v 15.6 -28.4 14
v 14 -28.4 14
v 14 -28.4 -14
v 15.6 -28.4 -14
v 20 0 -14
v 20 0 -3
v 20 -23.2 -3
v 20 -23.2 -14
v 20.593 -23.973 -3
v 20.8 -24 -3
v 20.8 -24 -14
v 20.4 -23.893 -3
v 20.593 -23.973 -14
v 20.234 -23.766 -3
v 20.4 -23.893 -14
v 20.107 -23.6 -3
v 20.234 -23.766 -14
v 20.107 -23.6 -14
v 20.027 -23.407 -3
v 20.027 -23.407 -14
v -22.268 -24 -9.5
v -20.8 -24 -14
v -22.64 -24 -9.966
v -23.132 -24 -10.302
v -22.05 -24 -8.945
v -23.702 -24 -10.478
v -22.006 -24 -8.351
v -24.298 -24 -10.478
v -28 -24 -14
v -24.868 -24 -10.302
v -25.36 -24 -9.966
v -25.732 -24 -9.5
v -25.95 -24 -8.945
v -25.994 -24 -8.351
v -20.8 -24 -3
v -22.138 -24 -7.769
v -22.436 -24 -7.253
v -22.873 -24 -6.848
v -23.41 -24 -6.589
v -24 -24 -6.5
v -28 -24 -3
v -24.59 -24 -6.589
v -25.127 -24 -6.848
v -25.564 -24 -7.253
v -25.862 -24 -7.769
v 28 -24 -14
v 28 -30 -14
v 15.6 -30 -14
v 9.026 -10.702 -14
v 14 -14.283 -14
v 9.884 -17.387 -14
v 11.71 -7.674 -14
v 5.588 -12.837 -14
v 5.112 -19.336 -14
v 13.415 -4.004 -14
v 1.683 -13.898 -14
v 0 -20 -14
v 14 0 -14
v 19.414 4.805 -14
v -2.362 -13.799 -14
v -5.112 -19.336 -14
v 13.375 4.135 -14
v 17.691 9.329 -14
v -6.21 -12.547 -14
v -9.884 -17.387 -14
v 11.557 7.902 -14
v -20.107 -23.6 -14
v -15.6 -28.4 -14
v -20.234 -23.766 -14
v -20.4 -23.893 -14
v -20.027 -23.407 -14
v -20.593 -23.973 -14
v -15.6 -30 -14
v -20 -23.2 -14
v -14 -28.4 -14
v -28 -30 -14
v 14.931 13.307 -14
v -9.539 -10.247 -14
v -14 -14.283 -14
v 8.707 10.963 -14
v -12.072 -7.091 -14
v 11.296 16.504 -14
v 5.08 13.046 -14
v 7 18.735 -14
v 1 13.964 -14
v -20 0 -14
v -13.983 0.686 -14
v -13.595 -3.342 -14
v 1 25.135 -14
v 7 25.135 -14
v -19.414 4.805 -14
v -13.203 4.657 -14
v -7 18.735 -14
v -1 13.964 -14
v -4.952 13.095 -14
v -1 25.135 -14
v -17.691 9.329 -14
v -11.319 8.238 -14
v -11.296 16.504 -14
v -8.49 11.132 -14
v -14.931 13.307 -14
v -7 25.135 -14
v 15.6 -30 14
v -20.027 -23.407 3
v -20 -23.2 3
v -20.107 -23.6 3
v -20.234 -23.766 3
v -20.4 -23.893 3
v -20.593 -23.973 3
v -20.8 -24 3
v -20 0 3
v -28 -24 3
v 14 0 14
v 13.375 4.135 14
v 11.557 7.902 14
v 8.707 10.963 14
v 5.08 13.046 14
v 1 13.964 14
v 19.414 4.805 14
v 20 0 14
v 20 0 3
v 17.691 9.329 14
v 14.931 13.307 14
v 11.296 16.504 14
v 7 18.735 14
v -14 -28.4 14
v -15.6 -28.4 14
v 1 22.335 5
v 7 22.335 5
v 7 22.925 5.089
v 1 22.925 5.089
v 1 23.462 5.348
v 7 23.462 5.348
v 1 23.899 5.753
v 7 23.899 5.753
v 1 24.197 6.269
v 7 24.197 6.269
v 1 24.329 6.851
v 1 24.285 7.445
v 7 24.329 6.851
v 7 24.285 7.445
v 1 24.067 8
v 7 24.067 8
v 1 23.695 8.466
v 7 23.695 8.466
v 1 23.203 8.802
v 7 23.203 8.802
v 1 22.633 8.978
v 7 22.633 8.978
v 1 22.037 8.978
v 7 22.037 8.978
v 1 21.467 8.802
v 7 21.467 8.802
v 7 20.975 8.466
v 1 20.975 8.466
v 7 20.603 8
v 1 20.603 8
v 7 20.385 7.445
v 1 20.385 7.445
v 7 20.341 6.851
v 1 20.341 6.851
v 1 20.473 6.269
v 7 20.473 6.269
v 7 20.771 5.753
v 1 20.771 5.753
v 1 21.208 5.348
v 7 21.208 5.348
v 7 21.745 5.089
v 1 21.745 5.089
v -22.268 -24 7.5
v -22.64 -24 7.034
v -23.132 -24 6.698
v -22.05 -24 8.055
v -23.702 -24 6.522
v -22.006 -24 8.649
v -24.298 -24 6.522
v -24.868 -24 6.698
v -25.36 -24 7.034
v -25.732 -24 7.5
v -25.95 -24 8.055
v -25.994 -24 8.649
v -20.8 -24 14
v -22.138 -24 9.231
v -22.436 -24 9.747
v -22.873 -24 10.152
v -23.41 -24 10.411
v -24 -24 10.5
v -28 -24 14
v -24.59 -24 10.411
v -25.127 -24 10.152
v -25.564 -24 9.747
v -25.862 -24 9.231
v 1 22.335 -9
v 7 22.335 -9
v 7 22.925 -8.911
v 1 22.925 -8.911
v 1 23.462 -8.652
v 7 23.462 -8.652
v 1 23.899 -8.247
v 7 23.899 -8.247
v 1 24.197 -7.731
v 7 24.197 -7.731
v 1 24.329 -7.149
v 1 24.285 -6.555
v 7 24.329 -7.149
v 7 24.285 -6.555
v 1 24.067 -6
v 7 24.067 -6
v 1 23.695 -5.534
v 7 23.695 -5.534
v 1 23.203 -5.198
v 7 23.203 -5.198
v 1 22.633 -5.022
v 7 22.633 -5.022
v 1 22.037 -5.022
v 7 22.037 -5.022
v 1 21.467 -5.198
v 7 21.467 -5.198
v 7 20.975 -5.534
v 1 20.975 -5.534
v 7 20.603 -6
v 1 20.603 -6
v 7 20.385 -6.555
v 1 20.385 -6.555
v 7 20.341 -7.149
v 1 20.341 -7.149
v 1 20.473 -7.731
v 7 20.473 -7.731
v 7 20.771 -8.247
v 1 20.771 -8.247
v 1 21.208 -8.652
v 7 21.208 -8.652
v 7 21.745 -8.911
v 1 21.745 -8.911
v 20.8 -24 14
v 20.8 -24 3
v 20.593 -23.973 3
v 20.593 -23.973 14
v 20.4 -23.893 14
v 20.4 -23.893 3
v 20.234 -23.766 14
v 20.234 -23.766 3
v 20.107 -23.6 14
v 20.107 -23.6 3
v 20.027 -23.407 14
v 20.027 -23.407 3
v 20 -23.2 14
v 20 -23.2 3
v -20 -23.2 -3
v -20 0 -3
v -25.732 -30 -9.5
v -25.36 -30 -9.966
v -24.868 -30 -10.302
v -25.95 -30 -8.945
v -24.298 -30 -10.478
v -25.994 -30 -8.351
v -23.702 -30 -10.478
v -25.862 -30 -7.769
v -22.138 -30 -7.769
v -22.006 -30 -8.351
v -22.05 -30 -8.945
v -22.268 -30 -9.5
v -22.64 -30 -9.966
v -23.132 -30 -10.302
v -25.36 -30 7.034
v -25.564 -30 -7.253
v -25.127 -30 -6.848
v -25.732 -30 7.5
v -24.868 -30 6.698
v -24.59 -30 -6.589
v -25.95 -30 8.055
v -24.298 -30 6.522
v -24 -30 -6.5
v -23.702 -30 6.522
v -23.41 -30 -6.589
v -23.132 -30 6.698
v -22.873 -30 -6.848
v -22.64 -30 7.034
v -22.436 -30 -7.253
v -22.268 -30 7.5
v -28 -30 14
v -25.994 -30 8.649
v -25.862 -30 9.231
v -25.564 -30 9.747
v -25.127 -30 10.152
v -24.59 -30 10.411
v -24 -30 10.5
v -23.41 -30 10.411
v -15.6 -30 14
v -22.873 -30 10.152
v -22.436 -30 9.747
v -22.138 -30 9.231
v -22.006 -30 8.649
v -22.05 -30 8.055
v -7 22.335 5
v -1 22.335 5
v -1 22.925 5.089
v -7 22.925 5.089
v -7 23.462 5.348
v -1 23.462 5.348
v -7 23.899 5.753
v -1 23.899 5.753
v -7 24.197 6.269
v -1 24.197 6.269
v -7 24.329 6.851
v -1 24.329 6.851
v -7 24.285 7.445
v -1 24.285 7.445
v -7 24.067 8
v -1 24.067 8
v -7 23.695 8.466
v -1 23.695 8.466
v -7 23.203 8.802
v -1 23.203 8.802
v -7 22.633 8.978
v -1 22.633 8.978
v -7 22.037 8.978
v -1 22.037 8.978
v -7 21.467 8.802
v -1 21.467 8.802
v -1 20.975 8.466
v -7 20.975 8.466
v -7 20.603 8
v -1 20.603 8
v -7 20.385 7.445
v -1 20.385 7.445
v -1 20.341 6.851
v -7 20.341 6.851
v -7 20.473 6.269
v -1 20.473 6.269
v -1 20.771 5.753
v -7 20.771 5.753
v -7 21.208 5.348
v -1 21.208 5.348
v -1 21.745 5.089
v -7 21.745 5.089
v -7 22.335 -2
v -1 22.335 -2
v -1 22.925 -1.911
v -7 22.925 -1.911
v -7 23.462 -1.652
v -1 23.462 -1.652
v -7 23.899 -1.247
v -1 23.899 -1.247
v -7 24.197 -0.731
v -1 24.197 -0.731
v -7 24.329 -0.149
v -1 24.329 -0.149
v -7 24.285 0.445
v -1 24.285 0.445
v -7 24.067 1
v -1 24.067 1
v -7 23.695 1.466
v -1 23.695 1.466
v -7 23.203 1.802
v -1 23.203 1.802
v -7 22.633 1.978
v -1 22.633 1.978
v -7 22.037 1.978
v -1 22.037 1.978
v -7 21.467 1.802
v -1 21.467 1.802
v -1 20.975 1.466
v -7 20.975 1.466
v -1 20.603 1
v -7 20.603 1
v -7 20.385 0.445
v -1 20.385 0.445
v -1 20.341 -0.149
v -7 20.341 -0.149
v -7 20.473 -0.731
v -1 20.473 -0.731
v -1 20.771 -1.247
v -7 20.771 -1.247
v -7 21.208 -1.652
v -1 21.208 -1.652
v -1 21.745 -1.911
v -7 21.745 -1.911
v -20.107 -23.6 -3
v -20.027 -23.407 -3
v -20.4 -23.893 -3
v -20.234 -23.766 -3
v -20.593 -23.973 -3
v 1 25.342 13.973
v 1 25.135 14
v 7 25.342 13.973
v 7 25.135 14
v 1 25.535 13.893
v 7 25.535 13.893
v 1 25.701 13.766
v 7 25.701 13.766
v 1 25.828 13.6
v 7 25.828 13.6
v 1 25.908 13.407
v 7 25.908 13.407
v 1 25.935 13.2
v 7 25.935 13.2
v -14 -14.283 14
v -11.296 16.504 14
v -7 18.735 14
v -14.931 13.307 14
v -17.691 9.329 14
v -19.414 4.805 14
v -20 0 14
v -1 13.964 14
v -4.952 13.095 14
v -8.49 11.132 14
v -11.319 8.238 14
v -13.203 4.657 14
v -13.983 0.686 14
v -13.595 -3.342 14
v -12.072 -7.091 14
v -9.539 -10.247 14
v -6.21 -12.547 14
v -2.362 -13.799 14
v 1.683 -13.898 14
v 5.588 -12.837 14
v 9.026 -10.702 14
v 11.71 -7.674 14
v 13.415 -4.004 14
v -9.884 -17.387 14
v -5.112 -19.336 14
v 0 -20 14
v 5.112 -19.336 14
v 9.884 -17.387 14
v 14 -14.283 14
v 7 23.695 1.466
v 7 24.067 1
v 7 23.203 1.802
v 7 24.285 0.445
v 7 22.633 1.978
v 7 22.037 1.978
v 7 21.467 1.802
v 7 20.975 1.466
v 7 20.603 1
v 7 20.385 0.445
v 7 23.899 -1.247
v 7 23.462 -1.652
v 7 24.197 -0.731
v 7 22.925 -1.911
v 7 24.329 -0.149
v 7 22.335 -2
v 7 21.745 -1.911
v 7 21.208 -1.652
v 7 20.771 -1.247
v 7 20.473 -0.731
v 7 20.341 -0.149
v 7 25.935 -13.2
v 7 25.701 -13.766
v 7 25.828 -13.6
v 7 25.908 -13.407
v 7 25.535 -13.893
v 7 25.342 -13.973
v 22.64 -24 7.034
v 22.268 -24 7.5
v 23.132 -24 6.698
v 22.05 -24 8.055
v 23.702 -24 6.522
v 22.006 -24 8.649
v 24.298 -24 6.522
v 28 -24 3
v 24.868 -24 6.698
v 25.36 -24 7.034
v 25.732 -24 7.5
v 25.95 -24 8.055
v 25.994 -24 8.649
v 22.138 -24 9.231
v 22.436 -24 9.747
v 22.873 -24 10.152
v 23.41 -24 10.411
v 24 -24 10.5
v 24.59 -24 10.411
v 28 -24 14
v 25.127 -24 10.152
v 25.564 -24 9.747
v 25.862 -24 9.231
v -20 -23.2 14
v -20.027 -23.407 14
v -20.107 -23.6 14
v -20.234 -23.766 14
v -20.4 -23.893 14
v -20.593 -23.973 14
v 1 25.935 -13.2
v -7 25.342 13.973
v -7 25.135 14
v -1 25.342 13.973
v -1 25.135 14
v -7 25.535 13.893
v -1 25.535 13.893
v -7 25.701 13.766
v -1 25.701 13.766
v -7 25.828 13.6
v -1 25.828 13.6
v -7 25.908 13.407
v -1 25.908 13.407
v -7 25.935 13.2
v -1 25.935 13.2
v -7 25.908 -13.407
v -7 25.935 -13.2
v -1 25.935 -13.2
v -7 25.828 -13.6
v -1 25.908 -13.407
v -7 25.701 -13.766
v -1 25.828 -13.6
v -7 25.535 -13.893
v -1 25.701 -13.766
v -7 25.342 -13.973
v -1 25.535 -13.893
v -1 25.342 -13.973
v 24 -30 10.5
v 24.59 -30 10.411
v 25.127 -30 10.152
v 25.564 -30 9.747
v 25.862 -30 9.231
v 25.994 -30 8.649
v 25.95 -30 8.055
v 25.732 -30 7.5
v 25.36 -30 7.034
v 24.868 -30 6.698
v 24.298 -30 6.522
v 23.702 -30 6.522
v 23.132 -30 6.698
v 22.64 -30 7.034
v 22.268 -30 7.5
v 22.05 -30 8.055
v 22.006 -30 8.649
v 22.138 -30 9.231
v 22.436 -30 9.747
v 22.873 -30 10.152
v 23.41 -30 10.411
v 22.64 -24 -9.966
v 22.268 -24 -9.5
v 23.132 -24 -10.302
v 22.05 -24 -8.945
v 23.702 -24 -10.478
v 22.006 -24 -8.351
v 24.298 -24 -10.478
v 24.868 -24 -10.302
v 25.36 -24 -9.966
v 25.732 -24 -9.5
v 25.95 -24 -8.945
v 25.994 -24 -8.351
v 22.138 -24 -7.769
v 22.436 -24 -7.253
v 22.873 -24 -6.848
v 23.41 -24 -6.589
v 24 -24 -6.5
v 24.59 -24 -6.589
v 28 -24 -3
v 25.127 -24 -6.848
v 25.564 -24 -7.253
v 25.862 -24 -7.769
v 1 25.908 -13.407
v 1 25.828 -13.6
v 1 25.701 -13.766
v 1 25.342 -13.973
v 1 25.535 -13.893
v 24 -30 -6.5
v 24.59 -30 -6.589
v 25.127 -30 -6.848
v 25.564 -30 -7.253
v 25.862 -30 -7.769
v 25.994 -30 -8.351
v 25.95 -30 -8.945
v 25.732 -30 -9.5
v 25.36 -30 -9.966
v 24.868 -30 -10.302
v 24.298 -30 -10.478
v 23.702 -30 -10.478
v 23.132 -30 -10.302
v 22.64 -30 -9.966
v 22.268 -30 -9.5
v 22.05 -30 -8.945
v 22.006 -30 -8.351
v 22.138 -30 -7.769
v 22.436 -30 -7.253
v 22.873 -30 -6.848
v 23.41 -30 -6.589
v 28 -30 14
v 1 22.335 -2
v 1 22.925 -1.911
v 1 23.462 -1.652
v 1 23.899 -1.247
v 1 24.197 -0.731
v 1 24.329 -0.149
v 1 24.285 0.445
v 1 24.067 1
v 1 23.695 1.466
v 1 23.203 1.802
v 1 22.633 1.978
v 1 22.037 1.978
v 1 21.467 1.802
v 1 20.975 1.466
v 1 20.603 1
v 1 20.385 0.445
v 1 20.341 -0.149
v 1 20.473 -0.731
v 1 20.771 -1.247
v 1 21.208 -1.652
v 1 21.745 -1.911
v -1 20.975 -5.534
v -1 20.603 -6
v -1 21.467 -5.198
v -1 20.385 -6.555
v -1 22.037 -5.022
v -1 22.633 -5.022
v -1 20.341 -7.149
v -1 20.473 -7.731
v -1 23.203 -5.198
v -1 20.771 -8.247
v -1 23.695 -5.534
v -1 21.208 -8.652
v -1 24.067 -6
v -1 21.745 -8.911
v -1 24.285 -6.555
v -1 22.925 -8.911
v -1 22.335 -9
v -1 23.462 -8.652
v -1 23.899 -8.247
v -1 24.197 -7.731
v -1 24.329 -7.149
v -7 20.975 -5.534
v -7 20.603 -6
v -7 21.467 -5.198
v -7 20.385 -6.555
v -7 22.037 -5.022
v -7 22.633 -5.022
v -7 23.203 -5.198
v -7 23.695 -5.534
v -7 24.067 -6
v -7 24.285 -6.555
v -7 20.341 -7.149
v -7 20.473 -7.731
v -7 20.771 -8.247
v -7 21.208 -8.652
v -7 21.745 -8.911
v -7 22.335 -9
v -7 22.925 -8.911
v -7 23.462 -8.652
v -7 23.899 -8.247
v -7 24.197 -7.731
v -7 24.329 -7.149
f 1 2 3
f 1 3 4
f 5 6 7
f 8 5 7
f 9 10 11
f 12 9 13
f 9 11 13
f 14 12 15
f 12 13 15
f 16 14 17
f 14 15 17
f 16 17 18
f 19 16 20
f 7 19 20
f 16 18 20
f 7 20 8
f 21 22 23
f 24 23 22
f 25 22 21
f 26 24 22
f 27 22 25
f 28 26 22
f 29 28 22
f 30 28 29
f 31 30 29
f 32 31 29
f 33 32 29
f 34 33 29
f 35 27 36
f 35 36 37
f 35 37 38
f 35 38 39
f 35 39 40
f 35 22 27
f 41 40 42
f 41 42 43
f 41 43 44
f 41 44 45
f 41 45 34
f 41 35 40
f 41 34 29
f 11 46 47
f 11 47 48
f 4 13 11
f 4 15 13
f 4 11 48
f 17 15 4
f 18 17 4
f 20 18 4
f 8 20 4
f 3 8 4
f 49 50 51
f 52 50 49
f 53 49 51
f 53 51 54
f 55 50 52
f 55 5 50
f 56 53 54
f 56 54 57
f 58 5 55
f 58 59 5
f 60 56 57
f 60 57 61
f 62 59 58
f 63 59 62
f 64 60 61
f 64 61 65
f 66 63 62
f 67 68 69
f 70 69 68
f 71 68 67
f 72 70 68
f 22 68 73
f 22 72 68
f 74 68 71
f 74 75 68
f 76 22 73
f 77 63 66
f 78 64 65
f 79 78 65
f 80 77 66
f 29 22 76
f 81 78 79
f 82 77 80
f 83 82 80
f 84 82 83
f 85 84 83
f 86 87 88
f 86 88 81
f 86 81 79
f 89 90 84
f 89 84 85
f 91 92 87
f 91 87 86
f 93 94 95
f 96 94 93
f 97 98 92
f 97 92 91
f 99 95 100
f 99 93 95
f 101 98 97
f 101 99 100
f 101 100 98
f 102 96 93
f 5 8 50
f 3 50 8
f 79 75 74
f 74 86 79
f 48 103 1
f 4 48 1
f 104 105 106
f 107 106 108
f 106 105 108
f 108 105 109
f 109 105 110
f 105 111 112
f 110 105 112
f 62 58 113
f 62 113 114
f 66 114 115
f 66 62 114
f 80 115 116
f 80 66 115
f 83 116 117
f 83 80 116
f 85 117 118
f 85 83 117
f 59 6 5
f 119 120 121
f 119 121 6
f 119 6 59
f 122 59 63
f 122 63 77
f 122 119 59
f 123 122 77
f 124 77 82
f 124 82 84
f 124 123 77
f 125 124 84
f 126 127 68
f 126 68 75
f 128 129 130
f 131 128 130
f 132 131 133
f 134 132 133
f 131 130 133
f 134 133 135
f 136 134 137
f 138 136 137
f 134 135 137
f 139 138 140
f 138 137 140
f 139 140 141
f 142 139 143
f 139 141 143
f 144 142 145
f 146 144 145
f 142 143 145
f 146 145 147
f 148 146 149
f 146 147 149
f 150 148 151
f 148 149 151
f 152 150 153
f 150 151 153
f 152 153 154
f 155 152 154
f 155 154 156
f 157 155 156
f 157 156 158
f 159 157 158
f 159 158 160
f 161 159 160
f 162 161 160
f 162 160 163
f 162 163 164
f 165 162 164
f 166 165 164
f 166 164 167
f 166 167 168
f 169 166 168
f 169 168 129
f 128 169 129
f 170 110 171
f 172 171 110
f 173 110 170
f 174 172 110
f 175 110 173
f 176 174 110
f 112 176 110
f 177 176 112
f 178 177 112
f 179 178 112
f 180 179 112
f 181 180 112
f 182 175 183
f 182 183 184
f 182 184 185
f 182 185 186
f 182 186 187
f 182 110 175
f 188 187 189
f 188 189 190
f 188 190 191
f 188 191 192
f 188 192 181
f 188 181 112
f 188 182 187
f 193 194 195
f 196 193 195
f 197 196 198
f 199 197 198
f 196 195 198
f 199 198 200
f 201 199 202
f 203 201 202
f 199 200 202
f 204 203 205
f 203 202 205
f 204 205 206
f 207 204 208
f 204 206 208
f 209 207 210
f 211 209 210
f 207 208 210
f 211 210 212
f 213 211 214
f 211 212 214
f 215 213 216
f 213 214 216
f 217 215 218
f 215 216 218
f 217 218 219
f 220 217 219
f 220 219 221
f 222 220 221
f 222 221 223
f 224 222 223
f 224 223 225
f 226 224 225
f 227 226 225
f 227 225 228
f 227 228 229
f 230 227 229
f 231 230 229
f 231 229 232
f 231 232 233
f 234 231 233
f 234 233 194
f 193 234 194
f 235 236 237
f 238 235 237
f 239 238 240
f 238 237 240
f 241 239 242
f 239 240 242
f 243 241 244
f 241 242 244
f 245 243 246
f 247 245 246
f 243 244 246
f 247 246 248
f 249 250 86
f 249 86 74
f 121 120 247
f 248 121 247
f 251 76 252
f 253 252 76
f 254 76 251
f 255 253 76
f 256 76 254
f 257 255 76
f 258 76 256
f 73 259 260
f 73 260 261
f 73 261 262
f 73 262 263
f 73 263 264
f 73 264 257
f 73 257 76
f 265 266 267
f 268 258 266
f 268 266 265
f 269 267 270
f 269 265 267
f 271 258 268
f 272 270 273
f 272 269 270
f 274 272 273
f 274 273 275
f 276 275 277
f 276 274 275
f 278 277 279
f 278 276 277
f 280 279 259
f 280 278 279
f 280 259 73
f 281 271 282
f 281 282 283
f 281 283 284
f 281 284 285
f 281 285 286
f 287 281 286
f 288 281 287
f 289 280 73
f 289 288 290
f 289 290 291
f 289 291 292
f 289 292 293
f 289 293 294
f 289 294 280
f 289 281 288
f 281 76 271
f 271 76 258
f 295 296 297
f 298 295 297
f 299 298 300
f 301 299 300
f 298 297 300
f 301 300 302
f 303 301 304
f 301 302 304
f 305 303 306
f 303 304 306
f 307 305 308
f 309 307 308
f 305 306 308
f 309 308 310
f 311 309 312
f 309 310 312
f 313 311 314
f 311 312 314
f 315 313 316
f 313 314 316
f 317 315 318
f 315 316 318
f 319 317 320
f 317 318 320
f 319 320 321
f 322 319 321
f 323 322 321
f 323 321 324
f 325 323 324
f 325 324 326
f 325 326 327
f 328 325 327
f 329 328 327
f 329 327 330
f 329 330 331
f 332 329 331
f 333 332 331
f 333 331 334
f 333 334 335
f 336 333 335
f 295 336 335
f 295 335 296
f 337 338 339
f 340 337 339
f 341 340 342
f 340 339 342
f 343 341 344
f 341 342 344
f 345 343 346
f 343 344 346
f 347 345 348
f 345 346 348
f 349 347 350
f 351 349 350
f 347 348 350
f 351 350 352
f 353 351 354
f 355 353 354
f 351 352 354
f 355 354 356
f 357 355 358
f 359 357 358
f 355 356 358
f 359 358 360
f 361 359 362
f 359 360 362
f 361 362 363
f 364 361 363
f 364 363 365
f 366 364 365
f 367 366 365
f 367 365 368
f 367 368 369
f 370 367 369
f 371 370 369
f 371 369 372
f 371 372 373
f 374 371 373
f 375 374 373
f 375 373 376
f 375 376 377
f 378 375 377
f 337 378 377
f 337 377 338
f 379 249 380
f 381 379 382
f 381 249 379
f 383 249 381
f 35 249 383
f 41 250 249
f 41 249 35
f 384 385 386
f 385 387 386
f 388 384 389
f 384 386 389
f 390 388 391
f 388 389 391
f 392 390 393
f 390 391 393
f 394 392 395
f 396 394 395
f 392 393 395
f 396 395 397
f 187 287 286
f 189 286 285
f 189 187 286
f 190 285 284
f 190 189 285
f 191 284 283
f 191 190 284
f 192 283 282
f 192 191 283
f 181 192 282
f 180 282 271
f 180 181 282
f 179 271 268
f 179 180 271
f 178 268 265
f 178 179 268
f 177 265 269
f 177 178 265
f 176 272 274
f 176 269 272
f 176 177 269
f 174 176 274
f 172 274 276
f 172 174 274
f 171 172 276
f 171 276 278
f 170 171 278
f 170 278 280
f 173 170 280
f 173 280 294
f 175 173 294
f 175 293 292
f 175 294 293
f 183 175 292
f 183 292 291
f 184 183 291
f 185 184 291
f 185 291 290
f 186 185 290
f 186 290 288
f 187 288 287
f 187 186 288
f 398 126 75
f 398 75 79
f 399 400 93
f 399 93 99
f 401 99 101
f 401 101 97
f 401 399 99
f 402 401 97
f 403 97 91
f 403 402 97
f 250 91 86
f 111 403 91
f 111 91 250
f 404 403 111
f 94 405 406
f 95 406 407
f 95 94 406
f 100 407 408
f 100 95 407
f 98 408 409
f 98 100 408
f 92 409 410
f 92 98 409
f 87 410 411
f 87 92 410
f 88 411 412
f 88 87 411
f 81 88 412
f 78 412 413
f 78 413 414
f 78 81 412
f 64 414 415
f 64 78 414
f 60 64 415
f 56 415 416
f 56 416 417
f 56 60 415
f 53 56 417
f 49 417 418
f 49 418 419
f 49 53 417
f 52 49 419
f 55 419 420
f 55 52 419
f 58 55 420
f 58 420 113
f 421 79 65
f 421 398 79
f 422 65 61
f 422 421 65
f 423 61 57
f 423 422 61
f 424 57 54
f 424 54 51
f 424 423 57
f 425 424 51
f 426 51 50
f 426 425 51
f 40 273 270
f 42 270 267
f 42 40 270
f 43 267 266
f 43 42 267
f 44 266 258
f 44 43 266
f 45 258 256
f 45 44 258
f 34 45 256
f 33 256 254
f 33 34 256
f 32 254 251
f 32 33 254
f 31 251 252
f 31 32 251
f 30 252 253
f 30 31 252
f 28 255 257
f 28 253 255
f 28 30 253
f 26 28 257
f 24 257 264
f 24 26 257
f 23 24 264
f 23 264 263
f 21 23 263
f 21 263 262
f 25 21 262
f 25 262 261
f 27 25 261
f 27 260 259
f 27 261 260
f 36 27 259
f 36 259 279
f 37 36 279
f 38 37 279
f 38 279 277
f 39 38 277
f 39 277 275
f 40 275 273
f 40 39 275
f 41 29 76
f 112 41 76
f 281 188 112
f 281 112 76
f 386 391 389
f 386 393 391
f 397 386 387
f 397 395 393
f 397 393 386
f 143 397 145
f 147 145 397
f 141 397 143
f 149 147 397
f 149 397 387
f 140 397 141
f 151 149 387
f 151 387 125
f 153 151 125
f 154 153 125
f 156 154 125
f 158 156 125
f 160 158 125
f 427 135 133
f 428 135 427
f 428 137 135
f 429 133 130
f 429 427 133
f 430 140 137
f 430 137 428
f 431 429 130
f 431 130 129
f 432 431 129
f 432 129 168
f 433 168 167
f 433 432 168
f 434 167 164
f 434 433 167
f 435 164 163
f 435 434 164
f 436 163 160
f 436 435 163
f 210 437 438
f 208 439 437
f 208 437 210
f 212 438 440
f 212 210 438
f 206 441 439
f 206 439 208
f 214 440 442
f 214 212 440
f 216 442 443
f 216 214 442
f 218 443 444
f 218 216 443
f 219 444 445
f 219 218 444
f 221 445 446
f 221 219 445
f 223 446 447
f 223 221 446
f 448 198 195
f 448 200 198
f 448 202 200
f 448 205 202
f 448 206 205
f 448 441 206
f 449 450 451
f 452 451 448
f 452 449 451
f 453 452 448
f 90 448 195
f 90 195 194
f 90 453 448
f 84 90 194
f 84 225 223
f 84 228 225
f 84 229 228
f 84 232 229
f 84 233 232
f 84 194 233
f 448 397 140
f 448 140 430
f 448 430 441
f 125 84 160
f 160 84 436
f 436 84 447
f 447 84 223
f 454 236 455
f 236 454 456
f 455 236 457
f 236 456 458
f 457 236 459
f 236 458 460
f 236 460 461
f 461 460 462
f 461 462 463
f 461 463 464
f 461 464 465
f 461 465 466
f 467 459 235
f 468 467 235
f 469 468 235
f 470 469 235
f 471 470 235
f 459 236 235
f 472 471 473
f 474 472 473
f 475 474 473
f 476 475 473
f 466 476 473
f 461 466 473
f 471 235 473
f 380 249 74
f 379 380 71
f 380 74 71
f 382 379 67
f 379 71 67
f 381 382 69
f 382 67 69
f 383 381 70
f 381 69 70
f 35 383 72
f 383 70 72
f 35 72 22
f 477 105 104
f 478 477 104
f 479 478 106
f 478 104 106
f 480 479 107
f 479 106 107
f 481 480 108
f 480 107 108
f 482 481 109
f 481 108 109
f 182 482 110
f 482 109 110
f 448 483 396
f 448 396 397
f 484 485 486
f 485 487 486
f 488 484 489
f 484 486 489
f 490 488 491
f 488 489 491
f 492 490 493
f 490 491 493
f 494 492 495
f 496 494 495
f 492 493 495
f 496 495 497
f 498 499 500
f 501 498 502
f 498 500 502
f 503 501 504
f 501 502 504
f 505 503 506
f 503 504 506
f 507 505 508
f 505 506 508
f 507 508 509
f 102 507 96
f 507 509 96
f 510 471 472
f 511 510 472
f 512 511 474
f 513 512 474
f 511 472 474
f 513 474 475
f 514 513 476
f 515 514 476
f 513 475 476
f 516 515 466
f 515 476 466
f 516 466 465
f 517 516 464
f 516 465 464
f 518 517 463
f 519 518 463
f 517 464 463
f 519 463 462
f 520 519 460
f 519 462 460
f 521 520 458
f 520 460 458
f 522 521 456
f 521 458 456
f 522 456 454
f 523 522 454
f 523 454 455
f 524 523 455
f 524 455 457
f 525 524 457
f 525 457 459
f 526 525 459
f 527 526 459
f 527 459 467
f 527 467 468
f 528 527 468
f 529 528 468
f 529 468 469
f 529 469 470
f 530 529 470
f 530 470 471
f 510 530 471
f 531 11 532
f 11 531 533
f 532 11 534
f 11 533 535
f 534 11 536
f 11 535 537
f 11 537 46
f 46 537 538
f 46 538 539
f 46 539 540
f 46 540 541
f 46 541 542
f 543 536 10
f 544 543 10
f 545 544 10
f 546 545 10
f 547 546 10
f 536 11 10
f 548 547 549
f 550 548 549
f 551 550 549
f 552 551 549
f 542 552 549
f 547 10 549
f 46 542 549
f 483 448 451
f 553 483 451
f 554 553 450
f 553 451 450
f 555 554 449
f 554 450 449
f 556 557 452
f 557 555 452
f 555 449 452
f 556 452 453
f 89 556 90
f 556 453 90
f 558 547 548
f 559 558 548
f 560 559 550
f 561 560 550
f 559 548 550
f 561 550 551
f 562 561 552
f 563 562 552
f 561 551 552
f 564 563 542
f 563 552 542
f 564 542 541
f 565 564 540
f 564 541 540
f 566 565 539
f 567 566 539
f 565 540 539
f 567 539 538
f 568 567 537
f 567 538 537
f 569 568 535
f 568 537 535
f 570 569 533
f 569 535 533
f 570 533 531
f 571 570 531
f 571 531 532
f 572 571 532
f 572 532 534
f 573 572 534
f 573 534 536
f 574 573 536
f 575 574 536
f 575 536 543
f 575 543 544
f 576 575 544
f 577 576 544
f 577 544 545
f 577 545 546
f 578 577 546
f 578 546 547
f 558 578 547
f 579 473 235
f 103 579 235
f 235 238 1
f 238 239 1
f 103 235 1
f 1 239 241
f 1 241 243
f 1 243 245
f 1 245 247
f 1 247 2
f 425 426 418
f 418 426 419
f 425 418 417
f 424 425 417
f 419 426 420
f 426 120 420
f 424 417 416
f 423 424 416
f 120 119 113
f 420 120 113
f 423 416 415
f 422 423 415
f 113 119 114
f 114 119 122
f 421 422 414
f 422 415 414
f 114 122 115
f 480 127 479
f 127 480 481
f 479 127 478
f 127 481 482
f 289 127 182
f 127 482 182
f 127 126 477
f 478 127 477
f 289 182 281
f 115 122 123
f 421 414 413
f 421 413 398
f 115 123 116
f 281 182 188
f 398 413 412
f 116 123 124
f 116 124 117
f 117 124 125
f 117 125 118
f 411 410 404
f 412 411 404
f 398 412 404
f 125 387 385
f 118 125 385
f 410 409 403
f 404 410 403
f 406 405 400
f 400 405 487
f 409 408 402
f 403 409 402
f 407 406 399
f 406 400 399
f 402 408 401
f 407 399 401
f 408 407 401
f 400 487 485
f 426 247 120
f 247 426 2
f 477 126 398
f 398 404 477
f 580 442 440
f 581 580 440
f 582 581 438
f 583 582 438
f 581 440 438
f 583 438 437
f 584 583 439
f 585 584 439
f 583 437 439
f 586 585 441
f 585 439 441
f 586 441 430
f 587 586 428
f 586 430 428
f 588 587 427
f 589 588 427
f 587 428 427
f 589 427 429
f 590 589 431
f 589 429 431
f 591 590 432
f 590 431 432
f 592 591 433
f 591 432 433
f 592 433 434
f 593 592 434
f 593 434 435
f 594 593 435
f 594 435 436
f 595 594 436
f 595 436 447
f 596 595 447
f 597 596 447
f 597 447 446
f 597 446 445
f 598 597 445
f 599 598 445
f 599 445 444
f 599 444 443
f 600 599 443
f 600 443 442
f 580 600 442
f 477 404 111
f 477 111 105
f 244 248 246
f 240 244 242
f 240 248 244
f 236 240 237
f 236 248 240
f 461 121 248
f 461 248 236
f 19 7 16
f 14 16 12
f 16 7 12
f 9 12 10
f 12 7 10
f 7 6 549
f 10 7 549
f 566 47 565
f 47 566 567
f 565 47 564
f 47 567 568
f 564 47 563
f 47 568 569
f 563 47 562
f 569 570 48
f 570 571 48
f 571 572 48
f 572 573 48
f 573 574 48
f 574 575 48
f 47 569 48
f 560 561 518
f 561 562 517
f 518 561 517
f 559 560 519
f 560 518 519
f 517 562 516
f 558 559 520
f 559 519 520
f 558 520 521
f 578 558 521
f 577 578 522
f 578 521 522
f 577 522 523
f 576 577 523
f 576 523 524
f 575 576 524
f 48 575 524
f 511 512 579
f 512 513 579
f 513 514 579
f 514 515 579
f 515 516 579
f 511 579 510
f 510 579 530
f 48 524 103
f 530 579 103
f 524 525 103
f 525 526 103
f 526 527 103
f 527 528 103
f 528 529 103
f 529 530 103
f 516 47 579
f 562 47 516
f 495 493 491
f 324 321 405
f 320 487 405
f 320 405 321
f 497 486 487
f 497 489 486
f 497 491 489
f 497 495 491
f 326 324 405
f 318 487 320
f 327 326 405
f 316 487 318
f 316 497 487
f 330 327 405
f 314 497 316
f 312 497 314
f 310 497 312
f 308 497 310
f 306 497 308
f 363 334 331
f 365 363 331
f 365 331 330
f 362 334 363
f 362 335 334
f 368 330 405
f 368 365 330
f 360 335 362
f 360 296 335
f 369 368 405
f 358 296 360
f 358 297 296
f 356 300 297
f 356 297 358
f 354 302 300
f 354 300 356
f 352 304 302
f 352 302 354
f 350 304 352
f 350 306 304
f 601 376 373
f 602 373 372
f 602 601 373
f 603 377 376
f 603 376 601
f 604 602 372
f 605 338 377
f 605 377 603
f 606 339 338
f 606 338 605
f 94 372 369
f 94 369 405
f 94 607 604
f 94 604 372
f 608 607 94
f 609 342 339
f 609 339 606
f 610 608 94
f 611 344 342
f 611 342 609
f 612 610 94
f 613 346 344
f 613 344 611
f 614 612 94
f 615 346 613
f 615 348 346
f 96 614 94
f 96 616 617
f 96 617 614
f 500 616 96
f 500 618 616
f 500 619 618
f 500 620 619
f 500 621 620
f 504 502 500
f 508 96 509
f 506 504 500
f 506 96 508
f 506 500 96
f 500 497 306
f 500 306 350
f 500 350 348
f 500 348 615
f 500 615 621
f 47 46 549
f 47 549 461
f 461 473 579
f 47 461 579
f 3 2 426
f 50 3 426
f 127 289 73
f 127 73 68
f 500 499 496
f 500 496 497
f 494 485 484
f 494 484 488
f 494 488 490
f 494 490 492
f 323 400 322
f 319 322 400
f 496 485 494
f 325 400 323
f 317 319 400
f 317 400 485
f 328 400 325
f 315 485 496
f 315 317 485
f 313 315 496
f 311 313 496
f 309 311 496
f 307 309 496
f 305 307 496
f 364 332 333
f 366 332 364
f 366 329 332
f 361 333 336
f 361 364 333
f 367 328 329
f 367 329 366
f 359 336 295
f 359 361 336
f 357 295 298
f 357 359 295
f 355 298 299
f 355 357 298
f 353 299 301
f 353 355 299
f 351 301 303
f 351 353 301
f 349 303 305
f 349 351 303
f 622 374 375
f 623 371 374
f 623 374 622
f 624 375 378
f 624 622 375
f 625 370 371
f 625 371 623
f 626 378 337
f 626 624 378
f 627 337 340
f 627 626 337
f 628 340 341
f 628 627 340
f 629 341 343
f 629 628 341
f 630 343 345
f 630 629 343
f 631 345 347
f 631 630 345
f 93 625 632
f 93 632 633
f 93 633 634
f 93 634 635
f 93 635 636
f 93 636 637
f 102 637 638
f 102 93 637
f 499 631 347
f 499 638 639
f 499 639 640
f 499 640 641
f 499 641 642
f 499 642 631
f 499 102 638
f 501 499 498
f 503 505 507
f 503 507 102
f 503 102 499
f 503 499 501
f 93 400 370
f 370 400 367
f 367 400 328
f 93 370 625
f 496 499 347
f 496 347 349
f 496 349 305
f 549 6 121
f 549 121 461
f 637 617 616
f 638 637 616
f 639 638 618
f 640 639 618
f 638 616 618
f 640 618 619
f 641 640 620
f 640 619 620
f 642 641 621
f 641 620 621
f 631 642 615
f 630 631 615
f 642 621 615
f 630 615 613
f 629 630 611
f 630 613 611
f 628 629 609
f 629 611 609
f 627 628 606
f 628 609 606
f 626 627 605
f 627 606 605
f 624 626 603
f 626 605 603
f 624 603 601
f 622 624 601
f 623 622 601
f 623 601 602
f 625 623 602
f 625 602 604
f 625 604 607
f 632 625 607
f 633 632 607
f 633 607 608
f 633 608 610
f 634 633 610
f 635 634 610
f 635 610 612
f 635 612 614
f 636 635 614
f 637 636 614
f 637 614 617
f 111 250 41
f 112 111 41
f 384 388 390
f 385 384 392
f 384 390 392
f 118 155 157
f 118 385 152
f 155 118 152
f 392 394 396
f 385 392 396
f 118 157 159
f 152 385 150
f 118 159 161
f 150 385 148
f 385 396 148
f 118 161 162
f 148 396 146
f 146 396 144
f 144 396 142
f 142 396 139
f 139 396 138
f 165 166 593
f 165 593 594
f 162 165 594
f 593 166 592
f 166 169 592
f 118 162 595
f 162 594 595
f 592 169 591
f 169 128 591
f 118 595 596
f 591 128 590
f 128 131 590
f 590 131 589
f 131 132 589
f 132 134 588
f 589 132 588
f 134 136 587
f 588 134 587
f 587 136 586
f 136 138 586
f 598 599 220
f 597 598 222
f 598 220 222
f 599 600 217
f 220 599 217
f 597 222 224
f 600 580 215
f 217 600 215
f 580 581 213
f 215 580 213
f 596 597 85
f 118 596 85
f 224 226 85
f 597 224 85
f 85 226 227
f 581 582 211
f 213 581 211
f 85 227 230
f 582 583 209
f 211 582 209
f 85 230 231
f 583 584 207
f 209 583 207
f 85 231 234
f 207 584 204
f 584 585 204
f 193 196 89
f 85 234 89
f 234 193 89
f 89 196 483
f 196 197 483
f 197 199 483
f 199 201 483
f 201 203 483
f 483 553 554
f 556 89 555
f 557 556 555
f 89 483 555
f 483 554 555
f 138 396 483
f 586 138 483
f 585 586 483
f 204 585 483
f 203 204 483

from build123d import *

# Parameters (mm, degrees)
SKETCH1_R                = 20
SKETCH1_R_2              = 14
BOSS_EXTRUDE1_DEPTH      = 14
BOSS_EXTRUDE2_DEPTH      = 28
SKETCH3_W                = 1.6
SKETCH3_H                = 1.6
CUT_EXTRUDE1_DEPTH       = 50.678969393
FILLET1_R                = 0.8
BOSS_EXTRUDE3_DEPTH      = 14
BOSS_EXTRUDE3_DEPTH_BACK = 14
SKETCH5_W                = 2
SKETCH5_H                = 28
CUT_EXTRUDE2_DEPTH       = 25
SKETCH6_R                = 2
CUT_EXTRUDE3_DEPTH       = 49.176757882
FILLET2_R                = 0.8
RIB1_REACH               = 45.359
SKETCH7_WALL_W           = 114.016154836
SKETCH7_WALL_H           = 6
SKETCH8_R                = 2
CUT_EXTRUDE4_DEPTH       = 59.936437162
SKETCH9_W                = 2
SKETCH9_H                = 14
CUT_EXTRUDE5_DEPTH       = 31


with BuildPart() as part:
    # Sketch1 → Boss-Extrude1 (new, symmetric)
    with BuildSketch(Plane.XY):
        Circle(SKETCH1_R)
        Circle(SKETCH1_R_2, mode=Mode.SUBTRACT)
    extrude(amount=BOSS_EXTRUDE1_DEPTH, both=True)

    # Sketch2 → Boss-Extrude2 (add)
    with BuildSketch(Plane.XY.offset(14)):
        with BuildLine():
            Line((-20, 0), (-20, -24))
            Line((-20, -24), (-28, -24))
            Line((-28, -24), (-28, -30))
            Line((-28, -30), (-14, -30))
            Line((-14, -30), (-14, -14.282856857))
            ThreePointArc((-14, -14.282856857), (-18.439088915, -7.745966692), (-20, 0))
        make_face()
        with BuildLine():
            Line((14, -30), (14, -14.282856857))
            ThreePointArc((14, -14.282856857), (18.439088915, -7.745966692), (20, 0))
            Line((20, 0), (20, -24))
            Line((20, -24), (28, -24))
            Line((28, -24), (28, -30))
            Line((28, -30), (14, -30))
        make_face()
    extrude(amount=-BOSS_EXTRUDE2_DEPTH)

    # Sketch3 → Cut-Extrude1 (cut, through all)
    with BuildSketch(Plane.XY.offset(14)):
        with Locations((-14.8, -29.2)):
            Rectangle(SKETCH3_W, SKETCH3_H)
        with Locations((14.8, -29.2)):
            Rectangle(SKETCH3_W, SKETCH3_H)
    extrude(amount=-CUT_EXTRUDE1_DEPTH, mode=Mode.SUBTRACT)

    # Fillet1
    fillet1_edges = [part.edges().sort_by_distance(p)[0] for p in [
        (-20, -24, 0),
        (20, -24, 0),
    ]]
    fillet(fillet1_edges, radius=FILLET1_R)

    # Sketch4 → Boss-Extrude3 (add, two sides: drawn at the far end of the back side and taken through both)
    with BuildSketch(Plane.XY.offset(-BOSS_EXTRUDE3_DEPTH_BACK)):
        with BuildLine():
            Line((-7, 18.734993995), (-7, 25.934993995))
            Line((-7, 25.934993995), (7, 25.934993995))
            Line((7, 25.934993995), (7, 18.734993995))
            ThreePointArc((7, 18.734993995), (0, 20), (-7, 18.734993995))
        make_face()
    extrude(amount=BOSS_EXTRUDE3_DEPTH + BOSS_EXTRUDE3_DEPTH_BACK)

    # Sketch5 → Cut-Extrude2 (cut)
    with BuildSketch(Plane(origin=(0, 25.934993995, 0), x_dir=(1, 0, 0), z_dir=(0, 1, 0))):
        with Locations((0, -14)):
            Rectangle(SKETCH5_W, SKETCH5_H)
    extrude(amount=-CUT_EXTRUDE2_DEPTH, mode=Mode.SUBTRACT)

    # Sketch6 → Cut-Extrude3 (cut, through all)
    with BuildSketch(Plane(origin=(7, 0, 0), x_dir=(0, 0, -1), z_dir=(1, 0, 0))):
        with Locations((0, 22.334993995)):
            Circle(SKETCH6_R)
        with Locations((-7, 22.334993995)):
            Circle(SKETCH6_R)
        with Locations((7, 22.334993995)):
            Circle(SKETCH6_R)
    extrude(amount=-CUT_EXTRUDE3_DEPTH, mode=Mode.SUBTRACT)

    # Fillet2
    fillet2_edges = [part.edges().sort_by_distance(p)[0] for p in [
        (-4, 25.934993995, 14),
        (0, 25.934993995, -14),
        (4, 25.934993995, 14),
    ]]
    fillet(fillet2_edges, radius=FILLET2_R)

    # Sketch7 wall → Rib1 (add, up to next)
    with BuildSketch(Plane(origin=(24, -12, 0), x_dir=(0.316227766017, -0.948683298051, 0), z_dir=(0.948683298051, 0.316227766017, 0)), mode=Mode.PRIVATE) as rib1_sk1:
        Rectangle(SKETCH7_WALL_W, SKETCH7_WALL_H)
    rib1_tool1 = extrude(rib1_sk1.sketch, amount=-RIB1_REACH, mode=Mode.PRIVATE) - part.part
    rib1 = rib1_tool1.solids().sort_by_distance((24, -12, 0))[0]
    add(rib1)

    # Sketch8 → Cut-Extrude4 (cut, through all)
    with BuildSketch(Plane(origin=(0, -24, 0), x_dir=(1, 0, 0), z_dir=(0, 1, 0))):
        with Locations(Location((24, 8.5, 0), (0, 0, 270))):
            Circle(SKETCH8_R)
        with Locations(Location((24, -8.5, 0), (0, 0, 270))):
            Circle(SKETCH8_R)
    cut_extrude4 = extrude(amount=-CUT_EXTRUDE4_DEPTH, mode=Mode.SUBTRACT)

    # Mirror1: Rib1, Cut-Extrude4 across plane
    add(rib1.mirror(Plane(origin=(0, 0, 0), x_dir=(0, 0, 1), z_dir=(1, 0, 0))))
    add(cut_extrude4.mirror(Plane(origin=(0, 0, 0), x_dir=(0, 0, 1), z_dir=(1, 0, 0))), mode=Mode.SUBTRACT)

    # Sketch9 → Cut-Extrude5 (cut)
    with BuildSketch(Plane(origin=(0, 25.934993995, 0), x_dir=(1, 0, 0), z_dir=(0, 1, 0))):
        with Locations((0, 7)):
            Rectangle(SKETCH9_W, SKETCH9_H)
    extrude(amount=-CUT_EXTRUDE5_DEPTH, mode=Mode.SUBTRACT)


solid = part.part
